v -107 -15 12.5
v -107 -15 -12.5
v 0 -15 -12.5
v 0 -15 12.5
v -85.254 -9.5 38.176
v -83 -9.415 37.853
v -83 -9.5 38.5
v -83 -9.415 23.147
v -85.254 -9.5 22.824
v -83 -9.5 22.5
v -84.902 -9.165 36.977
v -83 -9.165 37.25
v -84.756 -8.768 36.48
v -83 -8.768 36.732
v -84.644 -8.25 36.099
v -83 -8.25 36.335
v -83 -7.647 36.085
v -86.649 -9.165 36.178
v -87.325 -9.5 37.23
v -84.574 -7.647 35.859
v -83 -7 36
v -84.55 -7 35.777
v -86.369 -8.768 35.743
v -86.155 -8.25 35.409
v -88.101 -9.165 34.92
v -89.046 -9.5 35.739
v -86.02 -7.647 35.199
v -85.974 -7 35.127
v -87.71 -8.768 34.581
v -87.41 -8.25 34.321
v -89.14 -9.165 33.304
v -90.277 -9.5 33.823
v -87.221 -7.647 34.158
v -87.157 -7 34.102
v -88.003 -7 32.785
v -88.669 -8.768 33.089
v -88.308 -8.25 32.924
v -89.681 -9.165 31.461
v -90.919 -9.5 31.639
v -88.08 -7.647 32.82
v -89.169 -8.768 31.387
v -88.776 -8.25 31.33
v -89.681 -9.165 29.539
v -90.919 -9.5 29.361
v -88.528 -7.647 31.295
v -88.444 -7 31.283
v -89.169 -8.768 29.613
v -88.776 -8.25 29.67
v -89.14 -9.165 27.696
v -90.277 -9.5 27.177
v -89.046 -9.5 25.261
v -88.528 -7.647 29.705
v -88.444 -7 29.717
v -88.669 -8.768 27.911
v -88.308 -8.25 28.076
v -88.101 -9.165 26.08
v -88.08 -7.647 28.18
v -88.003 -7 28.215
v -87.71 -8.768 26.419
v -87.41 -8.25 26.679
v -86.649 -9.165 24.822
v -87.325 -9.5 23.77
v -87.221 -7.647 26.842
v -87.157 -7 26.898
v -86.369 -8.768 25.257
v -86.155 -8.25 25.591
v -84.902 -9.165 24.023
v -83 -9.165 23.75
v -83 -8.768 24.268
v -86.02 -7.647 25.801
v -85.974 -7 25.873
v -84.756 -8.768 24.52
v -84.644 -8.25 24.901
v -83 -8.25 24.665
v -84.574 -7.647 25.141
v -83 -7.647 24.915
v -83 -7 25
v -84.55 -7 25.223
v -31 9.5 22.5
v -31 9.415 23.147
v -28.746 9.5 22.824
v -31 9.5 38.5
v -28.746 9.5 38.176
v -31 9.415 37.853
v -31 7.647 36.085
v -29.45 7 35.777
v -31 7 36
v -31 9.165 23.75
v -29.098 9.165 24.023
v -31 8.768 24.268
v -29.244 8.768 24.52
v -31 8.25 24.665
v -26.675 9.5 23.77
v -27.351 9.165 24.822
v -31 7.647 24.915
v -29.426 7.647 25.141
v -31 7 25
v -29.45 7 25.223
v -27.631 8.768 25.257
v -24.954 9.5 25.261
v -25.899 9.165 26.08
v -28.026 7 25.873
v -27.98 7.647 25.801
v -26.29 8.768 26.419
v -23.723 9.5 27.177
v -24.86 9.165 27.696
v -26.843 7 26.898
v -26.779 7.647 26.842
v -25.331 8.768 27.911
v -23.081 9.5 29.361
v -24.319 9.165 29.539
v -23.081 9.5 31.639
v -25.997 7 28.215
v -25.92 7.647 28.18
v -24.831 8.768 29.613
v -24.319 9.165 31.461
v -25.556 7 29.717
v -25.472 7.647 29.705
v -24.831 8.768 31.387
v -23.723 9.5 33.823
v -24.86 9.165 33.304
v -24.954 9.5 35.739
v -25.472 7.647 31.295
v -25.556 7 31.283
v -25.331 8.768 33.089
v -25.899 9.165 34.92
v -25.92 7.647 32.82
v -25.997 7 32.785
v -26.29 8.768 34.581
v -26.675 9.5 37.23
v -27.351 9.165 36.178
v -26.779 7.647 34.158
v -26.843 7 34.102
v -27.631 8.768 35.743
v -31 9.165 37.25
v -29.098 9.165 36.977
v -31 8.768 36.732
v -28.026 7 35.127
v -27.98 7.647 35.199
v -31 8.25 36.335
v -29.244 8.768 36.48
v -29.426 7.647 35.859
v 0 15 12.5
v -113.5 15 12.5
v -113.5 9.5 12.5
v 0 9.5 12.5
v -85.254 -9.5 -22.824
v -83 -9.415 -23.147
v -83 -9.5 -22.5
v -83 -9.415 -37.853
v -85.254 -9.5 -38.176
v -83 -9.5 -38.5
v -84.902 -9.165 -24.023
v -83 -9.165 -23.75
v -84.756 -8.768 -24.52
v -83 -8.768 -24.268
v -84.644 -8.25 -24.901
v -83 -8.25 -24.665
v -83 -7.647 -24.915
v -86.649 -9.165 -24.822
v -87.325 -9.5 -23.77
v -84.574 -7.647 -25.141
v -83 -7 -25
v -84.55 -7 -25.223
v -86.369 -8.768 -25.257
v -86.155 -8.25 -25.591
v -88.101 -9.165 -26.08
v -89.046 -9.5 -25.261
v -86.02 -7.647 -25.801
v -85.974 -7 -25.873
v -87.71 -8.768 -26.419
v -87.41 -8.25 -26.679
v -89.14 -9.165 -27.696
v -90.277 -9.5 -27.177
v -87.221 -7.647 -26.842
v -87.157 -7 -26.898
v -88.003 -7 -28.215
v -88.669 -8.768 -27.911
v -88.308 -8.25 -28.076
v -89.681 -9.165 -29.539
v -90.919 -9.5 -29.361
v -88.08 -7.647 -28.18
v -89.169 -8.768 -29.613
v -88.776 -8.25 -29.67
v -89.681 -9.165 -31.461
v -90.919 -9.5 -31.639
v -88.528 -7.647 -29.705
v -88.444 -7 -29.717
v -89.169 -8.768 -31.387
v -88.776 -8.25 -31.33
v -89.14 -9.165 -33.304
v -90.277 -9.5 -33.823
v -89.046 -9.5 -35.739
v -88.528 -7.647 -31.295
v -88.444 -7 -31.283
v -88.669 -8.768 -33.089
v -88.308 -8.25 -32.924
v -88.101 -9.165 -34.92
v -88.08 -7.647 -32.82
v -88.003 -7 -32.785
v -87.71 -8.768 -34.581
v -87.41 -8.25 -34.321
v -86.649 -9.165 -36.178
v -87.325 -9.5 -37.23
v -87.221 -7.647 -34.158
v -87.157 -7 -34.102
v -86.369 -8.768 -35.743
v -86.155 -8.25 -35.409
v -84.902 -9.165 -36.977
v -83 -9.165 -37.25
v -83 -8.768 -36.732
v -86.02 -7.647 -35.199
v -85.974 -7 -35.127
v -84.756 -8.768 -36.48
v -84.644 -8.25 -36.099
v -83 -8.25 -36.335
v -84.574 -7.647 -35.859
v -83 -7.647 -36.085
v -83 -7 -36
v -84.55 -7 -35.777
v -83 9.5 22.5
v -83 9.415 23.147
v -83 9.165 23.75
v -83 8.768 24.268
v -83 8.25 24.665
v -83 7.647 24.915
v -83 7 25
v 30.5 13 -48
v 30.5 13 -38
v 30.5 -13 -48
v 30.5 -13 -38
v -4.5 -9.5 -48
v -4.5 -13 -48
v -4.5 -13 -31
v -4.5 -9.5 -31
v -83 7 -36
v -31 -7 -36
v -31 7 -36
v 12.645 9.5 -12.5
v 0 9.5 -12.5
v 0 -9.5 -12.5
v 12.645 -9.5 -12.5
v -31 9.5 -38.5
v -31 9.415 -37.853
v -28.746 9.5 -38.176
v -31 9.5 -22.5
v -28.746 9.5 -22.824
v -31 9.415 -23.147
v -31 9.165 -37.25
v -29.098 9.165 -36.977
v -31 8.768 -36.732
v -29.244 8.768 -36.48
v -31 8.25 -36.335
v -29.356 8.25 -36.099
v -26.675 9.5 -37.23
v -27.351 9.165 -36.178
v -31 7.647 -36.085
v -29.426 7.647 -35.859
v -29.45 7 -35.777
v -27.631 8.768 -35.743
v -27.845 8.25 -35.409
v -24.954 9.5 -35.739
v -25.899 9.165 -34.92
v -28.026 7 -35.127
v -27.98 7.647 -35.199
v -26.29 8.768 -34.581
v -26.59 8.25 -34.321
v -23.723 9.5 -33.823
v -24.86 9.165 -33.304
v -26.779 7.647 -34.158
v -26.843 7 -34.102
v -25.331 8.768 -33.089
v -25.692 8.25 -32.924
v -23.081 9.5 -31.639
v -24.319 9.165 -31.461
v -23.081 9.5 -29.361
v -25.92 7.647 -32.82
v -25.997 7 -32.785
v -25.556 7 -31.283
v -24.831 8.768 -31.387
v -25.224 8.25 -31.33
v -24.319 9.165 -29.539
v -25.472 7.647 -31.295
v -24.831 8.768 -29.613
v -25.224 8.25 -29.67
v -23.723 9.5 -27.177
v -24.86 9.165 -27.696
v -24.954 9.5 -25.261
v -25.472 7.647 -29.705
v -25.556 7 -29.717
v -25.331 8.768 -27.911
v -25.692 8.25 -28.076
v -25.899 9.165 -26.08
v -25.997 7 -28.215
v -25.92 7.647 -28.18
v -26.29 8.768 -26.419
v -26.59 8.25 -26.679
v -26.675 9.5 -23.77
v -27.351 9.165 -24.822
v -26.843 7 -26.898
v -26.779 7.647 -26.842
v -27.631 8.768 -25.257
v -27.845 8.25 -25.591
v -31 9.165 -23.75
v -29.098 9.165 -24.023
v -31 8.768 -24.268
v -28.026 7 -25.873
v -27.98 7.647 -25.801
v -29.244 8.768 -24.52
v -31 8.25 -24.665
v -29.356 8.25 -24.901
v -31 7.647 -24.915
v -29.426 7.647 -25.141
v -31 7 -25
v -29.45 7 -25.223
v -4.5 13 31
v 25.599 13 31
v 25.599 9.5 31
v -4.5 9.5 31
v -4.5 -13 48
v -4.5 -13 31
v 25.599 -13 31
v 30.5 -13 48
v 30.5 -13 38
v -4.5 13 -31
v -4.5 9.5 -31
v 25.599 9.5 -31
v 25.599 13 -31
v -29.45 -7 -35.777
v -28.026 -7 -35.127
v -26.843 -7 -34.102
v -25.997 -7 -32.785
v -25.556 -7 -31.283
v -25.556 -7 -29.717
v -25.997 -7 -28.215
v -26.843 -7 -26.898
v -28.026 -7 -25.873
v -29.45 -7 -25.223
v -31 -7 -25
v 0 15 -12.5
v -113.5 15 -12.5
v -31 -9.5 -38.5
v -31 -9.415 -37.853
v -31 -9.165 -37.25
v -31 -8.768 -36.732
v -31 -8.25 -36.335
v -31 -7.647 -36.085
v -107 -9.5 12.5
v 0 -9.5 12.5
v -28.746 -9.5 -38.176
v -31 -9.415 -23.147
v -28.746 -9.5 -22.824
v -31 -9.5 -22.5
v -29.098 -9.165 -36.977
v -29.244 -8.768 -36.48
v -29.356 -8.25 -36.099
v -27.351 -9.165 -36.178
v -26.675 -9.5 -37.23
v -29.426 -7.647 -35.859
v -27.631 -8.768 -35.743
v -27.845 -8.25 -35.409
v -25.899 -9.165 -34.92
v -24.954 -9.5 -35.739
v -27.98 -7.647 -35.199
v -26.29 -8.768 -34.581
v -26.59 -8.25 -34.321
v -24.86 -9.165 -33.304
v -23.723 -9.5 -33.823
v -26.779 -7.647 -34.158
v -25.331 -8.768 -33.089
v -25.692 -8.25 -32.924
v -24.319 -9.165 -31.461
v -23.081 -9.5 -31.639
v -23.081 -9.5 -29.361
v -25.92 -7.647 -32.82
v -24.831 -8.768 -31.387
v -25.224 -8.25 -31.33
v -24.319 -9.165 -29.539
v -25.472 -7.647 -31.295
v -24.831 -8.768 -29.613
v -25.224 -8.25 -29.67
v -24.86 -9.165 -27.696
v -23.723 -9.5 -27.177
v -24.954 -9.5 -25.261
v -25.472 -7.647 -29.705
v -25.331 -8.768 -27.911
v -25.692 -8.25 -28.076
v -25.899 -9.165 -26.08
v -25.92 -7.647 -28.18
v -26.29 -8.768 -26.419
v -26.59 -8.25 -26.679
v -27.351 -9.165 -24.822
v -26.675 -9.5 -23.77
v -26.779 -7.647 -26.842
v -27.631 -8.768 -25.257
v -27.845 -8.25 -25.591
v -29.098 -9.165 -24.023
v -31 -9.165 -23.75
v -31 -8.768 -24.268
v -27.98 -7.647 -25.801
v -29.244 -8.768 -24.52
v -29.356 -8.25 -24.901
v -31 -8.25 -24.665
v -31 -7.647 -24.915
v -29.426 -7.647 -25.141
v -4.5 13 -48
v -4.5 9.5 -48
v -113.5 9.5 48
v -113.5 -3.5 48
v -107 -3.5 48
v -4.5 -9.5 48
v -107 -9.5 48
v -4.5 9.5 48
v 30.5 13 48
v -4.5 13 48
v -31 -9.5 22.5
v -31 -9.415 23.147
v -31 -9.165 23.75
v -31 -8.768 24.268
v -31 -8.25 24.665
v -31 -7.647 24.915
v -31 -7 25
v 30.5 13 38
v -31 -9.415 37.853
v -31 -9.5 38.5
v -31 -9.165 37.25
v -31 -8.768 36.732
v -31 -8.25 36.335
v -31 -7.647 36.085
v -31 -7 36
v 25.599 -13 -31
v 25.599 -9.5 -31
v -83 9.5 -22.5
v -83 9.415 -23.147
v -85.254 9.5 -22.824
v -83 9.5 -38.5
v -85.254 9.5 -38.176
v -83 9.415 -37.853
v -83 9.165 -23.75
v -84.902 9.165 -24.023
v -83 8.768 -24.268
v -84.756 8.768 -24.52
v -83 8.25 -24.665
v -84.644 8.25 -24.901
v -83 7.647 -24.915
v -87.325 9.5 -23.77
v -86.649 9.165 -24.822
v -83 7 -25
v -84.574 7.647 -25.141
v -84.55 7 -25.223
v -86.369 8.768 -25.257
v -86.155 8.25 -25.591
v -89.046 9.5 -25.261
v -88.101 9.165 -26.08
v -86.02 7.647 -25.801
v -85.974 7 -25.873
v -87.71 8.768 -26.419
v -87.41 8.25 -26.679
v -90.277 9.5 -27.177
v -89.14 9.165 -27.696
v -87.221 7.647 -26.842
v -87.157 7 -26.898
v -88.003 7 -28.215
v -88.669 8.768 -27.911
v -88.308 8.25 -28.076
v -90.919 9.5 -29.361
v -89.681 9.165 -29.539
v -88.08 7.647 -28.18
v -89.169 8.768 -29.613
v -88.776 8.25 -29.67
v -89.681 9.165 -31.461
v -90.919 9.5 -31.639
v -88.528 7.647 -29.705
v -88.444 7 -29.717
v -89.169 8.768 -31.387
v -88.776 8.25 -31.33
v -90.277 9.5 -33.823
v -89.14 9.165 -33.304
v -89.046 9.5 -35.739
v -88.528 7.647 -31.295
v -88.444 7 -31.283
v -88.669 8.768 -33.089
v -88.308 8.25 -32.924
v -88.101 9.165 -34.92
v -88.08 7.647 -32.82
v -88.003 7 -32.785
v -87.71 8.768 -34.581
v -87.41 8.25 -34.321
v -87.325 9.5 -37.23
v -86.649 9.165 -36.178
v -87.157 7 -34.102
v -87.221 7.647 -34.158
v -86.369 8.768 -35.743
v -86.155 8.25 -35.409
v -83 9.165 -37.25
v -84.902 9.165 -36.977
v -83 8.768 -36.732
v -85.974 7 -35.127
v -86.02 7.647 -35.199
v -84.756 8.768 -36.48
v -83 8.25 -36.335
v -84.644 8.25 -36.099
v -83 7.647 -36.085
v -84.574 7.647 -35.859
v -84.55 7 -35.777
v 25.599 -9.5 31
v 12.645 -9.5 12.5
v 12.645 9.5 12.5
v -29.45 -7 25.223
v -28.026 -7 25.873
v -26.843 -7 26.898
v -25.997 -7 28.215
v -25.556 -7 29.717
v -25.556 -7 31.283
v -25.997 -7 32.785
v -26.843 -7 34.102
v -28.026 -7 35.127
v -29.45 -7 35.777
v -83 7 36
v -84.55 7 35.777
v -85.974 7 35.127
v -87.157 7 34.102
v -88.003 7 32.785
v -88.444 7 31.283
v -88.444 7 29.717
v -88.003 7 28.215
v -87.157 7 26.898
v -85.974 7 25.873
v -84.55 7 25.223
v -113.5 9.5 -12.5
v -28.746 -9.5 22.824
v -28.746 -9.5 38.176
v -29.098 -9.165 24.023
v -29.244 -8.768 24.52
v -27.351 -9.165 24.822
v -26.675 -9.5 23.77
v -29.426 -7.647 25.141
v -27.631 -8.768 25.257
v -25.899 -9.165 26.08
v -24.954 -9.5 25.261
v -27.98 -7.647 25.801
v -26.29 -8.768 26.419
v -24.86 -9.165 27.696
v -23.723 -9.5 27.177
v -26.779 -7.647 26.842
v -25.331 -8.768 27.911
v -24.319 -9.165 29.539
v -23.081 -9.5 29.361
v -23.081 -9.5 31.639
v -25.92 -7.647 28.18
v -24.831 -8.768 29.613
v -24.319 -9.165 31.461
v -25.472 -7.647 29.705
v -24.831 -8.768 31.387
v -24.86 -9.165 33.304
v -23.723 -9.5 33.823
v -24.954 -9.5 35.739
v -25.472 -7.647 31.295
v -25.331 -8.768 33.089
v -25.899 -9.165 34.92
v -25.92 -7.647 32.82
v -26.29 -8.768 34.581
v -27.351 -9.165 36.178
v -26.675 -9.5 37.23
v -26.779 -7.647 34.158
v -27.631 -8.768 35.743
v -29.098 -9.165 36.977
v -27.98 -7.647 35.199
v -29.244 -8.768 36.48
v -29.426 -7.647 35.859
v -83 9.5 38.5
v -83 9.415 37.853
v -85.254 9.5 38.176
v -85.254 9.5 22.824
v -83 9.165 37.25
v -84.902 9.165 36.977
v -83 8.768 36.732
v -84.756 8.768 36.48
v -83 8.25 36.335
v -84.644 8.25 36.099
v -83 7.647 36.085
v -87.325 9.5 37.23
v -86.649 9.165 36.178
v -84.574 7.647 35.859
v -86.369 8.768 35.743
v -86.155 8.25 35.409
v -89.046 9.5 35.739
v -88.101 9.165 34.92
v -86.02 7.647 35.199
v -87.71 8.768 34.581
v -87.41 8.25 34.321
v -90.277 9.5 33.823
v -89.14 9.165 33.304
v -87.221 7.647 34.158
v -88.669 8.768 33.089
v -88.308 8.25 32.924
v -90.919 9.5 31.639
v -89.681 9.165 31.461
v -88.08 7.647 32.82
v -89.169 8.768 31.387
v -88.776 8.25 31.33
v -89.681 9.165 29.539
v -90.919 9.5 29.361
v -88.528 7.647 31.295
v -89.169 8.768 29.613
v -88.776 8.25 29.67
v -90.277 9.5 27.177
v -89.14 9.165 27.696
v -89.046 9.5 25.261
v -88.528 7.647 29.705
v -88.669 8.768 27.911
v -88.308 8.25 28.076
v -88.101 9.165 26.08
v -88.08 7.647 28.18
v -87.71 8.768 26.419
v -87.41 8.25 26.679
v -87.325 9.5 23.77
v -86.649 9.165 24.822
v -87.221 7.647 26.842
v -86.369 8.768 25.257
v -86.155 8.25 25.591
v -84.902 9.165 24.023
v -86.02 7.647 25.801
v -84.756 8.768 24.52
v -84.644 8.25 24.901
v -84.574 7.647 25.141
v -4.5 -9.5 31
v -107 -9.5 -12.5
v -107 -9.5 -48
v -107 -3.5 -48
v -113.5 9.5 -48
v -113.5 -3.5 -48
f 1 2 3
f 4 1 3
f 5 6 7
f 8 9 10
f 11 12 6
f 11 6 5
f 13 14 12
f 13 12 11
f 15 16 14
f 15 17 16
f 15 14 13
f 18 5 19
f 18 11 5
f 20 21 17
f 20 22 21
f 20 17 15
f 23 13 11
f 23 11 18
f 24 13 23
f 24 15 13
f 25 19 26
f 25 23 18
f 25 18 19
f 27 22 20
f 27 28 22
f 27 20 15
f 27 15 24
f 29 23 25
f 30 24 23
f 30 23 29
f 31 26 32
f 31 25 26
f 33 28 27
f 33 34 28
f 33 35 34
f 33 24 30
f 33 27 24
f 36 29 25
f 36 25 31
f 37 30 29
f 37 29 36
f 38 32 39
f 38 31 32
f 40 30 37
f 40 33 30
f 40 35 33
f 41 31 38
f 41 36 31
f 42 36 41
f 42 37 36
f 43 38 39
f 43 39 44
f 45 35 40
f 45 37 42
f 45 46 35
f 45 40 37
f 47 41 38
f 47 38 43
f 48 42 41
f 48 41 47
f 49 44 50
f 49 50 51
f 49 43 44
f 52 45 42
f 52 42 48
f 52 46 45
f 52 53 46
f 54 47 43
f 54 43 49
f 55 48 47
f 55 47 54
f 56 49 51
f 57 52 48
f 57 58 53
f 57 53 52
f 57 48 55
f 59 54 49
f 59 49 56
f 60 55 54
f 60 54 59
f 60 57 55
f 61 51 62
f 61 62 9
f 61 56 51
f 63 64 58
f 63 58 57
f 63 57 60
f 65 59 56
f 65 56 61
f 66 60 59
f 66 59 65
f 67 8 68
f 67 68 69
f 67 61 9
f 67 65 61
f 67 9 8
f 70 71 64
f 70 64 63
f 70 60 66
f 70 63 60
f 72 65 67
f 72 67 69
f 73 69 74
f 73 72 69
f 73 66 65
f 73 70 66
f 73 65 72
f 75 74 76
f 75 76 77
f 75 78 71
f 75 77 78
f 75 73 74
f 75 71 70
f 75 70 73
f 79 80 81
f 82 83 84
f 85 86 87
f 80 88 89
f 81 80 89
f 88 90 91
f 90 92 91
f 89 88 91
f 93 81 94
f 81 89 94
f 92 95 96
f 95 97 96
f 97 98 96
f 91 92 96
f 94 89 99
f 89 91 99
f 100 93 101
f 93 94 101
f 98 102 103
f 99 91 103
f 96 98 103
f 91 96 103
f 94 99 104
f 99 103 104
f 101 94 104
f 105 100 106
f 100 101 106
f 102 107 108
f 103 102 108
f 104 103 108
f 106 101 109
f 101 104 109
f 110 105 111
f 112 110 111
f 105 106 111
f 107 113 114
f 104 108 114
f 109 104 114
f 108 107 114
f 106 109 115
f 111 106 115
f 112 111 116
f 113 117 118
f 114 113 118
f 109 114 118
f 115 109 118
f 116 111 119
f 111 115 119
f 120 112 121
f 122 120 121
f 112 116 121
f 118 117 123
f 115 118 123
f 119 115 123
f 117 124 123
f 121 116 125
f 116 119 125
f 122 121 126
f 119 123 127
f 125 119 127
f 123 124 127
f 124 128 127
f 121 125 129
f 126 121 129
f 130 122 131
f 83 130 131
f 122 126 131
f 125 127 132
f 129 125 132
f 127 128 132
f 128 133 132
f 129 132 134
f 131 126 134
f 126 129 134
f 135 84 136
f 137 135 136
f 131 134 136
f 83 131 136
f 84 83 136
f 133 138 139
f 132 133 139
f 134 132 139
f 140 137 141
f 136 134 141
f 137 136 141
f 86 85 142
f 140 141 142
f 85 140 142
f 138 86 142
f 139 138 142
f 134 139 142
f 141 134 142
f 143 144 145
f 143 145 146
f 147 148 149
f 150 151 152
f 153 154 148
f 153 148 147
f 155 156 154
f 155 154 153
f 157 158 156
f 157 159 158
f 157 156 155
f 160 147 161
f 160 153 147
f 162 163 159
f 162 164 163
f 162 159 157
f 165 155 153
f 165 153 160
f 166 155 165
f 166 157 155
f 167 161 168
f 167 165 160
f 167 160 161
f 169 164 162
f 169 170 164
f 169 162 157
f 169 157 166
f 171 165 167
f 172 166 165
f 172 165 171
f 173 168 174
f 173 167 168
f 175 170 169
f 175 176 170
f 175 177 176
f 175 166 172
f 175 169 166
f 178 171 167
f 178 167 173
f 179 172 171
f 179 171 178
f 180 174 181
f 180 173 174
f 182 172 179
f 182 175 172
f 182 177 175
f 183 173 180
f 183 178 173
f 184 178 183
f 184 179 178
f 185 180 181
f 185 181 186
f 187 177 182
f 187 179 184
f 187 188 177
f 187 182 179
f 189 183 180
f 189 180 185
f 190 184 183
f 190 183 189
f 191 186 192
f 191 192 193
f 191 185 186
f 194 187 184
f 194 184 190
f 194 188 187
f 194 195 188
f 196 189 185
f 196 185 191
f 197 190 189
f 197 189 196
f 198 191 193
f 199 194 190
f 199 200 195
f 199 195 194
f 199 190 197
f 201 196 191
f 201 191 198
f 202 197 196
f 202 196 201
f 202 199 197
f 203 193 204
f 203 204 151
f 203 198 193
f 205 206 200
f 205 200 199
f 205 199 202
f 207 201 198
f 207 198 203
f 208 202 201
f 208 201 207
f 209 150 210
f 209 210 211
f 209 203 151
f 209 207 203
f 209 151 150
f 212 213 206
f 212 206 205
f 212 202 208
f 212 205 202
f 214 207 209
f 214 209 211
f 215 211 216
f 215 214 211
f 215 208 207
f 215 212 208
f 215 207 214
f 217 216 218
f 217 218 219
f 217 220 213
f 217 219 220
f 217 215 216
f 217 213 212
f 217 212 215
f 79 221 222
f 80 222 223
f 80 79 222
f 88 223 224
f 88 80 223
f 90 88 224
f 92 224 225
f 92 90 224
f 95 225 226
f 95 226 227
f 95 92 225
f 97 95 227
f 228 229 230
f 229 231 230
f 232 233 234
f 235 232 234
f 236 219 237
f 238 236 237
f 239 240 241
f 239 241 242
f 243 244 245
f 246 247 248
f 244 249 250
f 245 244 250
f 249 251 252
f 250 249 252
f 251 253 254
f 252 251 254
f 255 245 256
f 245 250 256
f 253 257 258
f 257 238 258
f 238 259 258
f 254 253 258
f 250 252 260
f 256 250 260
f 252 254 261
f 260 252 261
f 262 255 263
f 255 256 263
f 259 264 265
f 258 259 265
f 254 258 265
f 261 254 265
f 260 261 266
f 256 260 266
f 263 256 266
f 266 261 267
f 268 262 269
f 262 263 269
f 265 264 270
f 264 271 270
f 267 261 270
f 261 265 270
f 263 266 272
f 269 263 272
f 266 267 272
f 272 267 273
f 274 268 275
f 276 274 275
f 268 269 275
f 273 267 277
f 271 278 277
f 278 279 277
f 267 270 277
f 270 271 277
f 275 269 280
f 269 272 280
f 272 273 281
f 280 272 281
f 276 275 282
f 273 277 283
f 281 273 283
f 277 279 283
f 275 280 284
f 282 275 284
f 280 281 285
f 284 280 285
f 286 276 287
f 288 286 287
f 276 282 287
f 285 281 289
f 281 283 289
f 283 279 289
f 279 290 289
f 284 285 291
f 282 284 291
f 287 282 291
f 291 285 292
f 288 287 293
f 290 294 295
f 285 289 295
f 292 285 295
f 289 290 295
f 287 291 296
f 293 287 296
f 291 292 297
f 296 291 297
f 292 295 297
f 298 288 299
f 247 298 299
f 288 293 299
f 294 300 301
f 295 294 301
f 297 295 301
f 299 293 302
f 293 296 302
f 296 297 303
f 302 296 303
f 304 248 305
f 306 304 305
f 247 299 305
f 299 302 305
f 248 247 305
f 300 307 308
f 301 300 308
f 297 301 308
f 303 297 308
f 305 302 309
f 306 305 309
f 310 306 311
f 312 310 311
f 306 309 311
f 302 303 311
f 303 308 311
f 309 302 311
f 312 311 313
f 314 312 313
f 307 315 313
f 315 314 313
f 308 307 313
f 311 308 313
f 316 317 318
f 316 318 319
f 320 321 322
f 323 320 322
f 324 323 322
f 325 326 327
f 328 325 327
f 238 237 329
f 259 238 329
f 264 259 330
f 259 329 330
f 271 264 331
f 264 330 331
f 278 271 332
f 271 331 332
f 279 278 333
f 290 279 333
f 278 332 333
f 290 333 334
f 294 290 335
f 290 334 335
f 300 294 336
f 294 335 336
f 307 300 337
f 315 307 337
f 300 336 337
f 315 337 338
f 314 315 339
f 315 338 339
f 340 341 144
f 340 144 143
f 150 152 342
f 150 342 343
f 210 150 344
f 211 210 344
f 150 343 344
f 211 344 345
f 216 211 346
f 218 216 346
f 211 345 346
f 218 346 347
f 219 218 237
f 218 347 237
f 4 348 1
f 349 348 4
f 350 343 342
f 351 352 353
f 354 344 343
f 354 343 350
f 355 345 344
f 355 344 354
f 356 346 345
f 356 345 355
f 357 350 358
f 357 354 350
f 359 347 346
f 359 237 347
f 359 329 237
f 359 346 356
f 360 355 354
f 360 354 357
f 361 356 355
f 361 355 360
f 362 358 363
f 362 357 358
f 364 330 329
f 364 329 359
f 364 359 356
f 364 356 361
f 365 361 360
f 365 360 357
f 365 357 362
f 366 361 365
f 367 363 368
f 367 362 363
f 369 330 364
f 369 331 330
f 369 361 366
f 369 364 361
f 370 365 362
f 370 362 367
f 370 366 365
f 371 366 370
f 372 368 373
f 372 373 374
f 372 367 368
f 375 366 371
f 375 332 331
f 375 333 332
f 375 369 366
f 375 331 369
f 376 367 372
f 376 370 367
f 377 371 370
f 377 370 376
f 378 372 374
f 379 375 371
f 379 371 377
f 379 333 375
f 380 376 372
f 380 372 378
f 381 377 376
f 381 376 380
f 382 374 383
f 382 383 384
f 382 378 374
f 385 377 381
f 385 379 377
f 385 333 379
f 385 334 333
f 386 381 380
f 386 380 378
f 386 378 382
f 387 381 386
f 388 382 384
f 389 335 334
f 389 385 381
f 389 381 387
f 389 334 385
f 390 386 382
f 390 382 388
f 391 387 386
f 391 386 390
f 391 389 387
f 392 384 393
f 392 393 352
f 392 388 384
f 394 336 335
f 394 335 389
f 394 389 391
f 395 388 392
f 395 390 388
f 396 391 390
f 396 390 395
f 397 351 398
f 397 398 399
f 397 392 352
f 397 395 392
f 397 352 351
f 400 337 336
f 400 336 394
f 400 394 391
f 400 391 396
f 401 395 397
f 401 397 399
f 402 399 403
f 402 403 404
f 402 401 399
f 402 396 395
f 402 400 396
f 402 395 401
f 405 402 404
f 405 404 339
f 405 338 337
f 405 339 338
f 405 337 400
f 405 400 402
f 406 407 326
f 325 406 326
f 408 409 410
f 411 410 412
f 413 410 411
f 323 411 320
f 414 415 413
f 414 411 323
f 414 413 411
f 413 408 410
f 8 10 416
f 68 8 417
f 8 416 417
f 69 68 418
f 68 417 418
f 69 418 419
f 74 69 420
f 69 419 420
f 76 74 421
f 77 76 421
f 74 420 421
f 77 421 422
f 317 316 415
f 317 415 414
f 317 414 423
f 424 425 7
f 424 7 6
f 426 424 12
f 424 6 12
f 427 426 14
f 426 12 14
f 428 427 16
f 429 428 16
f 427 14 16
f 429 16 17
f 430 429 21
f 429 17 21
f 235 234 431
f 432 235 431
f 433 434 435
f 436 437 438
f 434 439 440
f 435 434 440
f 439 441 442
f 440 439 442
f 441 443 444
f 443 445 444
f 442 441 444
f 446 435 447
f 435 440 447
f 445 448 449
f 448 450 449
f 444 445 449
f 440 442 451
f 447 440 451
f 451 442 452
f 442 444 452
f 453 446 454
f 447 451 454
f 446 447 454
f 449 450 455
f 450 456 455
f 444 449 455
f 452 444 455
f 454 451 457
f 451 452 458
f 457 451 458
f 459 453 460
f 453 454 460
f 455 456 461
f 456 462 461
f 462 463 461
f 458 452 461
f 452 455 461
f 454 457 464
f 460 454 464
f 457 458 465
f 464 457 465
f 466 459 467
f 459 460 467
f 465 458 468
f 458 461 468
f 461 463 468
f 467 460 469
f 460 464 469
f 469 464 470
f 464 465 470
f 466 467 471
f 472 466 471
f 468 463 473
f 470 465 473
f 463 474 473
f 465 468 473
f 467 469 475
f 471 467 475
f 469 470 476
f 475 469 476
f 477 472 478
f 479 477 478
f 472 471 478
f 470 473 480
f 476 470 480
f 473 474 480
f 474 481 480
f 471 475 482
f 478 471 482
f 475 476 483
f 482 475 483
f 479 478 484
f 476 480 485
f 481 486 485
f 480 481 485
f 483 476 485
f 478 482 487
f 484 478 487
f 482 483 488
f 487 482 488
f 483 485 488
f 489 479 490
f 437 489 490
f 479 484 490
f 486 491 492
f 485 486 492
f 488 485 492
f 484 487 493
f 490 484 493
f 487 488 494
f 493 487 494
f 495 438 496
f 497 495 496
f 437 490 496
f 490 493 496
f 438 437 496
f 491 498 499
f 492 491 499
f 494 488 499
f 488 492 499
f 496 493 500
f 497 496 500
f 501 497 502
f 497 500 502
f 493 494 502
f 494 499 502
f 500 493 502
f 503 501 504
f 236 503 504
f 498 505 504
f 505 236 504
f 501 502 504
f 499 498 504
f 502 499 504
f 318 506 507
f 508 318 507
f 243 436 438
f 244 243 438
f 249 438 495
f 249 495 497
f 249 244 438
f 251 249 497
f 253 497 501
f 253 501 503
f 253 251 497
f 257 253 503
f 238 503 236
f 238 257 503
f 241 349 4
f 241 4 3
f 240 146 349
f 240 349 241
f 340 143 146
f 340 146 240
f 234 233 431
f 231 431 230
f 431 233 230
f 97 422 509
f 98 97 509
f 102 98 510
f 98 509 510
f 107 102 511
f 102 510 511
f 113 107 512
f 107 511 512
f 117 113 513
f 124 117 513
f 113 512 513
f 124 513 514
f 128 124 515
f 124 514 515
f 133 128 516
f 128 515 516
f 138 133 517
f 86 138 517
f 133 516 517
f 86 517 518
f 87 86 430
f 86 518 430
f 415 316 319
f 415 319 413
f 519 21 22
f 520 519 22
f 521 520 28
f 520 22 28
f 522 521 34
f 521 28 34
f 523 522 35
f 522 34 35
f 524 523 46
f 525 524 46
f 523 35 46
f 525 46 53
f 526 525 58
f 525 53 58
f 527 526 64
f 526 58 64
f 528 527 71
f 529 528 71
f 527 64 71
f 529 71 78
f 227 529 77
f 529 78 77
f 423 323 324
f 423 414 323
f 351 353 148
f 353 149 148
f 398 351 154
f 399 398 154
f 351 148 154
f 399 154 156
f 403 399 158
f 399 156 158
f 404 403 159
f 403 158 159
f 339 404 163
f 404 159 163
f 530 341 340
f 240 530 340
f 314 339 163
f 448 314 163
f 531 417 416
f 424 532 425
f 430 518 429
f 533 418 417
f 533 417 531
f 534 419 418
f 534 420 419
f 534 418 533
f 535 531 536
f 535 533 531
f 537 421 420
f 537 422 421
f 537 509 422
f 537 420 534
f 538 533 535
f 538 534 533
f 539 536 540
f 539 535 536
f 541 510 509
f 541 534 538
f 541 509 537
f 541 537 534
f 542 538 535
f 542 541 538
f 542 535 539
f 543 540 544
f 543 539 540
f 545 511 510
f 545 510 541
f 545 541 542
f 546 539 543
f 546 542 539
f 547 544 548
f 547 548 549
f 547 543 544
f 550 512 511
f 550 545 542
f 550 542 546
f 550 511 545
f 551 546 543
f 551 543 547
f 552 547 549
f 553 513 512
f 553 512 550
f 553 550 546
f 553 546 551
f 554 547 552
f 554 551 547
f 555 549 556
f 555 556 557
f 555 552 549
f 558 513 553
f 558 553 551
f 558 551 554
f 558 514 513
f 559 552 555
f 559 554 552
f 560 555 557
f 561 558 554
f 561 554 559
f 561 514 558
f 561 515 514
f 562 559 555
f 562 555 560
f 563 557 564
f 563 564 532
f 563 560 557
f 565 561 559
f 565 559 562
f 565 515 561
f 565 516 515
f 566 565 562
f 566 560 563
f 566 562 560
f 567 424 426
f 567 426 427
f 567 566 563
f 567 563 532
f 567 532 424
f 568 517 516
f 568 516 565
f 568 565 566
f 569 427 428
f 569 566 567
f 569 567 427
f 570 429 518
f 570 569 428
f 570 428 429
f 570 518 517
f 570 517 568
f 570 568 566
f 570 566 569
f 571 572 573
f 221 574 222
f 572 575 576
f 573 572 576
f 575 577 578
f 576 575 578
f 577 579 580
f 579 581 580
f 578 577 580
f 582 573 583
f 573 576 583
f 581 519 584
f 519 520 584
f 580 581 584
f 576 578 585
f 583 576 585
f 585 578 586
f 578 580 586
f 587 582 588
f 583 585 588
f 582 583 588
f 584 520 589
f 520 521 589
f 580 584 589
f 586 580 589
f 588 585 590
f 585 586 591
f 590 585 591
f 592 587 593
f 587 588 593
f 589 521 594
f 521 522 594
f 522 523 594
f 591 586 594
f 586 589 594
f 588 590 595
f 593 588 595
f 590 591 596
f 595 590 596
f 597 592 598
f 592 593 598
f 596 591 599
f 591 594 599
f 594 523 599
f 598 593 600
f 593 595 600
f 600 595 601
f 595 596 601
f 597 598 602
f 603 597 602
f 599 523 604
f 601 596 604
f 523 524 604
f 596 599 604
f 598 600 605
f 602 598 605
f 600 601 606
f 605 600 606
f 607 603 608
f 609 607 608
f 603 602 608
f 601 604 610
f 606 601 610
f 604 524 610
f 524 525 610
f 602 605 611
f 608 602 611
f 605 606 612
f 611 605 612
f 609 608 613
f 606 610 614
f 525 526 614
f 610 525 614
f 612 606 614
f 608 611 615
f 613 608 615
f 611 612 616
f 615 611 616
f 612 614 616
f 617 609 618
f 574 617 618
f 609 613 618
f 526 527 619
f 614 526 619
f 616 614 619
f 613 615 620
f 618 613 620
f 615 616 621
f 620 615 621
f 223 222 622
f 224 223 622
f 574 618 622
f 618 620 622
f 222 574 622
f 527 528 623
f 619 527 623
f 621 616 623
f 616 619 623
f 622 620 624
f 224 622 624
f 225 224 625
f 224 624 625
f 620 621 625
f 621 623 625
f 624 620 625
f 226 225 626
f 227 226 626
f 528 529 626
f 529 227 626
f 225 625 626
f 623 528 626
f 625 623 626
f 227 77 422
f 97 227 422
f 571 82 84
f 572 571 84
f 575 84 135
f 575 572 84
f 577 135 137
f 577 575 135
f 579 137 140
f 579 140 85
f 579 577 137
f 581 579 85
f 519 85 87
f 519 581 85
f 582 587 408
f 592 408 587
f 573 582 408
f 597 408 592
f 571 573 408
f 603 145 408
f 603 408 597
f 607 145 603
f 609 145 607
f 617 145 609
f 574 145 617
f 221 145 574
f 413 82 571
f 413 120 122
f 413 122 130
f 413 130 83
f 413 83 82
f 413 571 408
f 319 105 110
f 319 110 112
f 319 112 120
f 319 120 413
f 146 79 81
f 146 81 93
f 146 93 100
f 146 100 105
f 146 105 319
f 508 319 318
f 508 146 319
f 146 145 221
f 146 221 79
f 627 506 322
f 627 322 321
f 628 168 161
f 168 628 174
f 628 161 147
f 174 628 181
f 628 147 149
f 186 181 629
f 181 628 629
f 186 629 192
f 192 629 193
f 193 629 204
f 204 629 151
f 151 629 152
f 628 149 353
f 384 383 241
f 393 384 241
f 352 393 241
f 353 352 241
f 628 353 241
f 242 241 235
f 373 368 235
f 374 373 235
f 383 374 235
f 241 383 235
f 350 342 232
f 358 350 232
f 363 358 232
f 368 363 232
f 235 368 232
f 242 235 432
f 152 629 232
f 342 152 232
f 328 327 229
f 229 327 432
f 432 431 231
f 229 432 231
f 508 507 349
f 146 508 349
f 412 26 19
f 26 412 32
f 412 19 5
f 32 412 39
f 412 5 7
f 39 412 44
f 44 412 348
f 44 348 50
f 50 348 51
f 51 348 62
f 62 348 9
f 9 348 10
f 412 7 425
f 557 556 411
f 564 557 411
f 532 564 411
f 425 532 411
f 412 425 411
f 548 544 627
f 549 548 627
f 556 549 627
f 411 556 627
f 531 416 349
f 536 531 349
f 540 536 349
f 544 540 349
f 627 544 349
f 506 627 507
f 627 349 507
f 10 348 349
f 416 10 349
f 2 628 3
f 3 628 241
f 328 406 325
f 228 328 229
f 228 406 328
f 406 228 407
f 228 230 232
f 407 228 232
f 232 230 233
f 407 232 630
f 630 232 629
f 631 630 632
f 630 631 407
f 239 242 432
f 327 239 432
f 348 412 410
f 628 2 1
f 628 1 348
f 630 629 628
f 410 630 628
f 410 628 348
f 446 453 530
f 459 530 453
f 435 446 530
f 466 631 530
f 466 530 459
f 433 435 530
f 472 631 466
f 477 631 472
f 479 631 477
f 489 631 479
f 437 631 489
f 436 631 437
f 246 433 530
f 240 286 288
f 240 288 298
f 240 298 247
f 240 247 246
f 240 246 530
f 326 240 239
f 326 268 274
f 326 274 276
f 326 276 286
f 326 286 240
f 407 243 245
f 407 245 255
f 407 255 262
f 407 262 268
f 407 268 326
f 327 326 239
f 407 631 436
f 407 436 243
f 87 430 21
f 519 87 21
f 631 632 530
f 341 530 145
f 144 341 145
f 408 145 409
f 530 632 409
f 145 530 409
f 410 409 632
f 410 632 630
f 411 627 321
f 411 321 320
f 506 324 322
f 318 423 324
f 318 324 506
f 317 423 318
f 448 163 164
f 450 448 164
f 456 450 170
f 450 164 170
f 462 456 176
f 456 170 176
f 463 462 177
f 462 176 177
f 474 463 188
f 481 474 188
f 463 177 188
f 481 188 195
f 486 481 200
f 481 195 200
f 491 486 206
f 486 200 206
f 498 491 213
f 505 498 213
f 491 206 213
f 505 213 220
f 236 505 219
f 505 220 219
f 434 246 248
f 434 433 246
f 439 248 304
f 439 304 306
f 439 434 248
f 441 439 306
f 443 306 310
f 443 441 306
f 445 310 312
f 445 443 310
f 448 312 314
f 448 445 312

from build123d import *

# Parameters (mm, degrees)
ESQUISSE1_W                  = 113.5
ESQUISSE1_H                  = 25
BOSS_EXTRU_1_DEPTH           = 15
BOSS_EXTRU_2_DEPTH           = 9.5
BOSS_EXTRU_2_DEPTH_BACK      = 9.5
BOSS_EXTRU_3_DEPTH           = 13
ENL_V_MAT_EXTRU_1_DEPTH      = 125.142055726
ENL_V_MAT_EXTRU_1_DEPTH_BACK = 125.142055726
ESQUISSE2_W                  = 6.5
ESQUISSE2_H                  = 11.5
CONG_1_R                     = 2.5


with BuildPart() as part:
    # Esquisse1 → Boss.-Extru.1 (new, symmetric)
    with BuildSketch(Plane(origin=(0, 0, 0), x_dir=(1, 0, 0), z_dir=(0, 1, 0))):
        with Locations((-56.75, 0)):
            Rectangle(ESQUISSE1_W, ESQUISSE1_H)
    extrude(amount=BOSS_EXTRU_1_DEPTH, both=True)

    # Esquisse1<3> → Boss.-Extru.2 (add, two sides: drawn at the far end of the back side and taken through both)
    # profile 1 of 2: a face of its own
    with BuildSketch(Plane(origin=(0, 0, 0), x_dir=(1, 0, 0), z_dir=(0, 1, 0)).offset(-BOSS_EXTRU_2_DEPTH_BACK)):
        Polygon((12.644707776, -12.5), (0, -12.5), (-113.5, -12.5), (-113.5, -48), (-4.5, -48), (-4.5, -31), (25.598547233, -31), align=None)
        with BuildLine():
            Line((-31, -36), (-83, -36))
            ThreePointArc((-83, -36), (-88.5, -30.5), (-83, -25))
            Line((-83, -25), (-31, -25))
            ThreePointArc((-31, -25), (-25.5, -30.5), (-31, -36))
        make_face(mode=Mode.SUBTRACT)
    # profile 2 of 2: a face of its own
    with BuildSketch(Plane(origin=(0, 0, 0), x_dir=(1, 0, 0), z_dir=(0, 1, 0)).offset(-BOSS_EXTRU_2_DEPTH_BACK)):
        Polygon((-113.5, 12.5), (0, 12.5), (12.644707776, 12.5), (25.598547233, 31), (-4.5, 31), (-4.5, 48), (-113.5, 48), align=None)
        with BuildLine():
            ThreePointArc((-83, 25), (-88.5, 30.5), (-83, 36))
            Line((-83, 36), (-31, 36))
            ThreePointArc((-31, 36), (-25.5, 30.5), (-31, 25))
            Line((-31, 25), (-83, 25))
        make_face(mode=Mode.SUBTRACT)
    extrude(amount=BOSS_EXTRU_2_DEPTH + BOSS_EXTRU_2_DEPTH_BACK)

    # Esquisse1<4> → Boss.-Extru.3 (add, symmetric)
    with BuildSketch(Plane(origin=(0, 0, 0), x_dir=(1, 0, 0), z_dir=(0, 1, 0))):
        Polygon((-4.5, 31), (25.598547233, 31), (30.5, 38), (30.5, 48), (-4.5, 48), align=None)
        Polygon((30.5, -38), (25.598547233, -31), (-4.5, -31), (-4.5, -48), (30.5, -48), align=None)
    extrude(amount=BOSS_EXTRU_3_DEPTH, both=True)

    # Esquisse2 → Enlèv. mat.-Extru.1 (cut, two sides: drawn at the far end of the back side and taken through both)
    with BuildSketch(Plane.XY.offset(-ENL_V_MAT_EXTRU_1_DEPTH_BACK)):
        with Locations((-110.25, -9.25)):
            Rectangle(ESQUISSE2_W, ESQUISSE2_H)
    extrude(amount=ENL_V_MAT_EXTRU_1_DEPTH + ENL_V_MAT_EXTRU_1_DEPTH_BACK, mode=Mode.SUBTRACT)

    # Congé1
    cong_1_edges = [part.edges().sort_by_distance(p)[0] for p in [
        (-57, 9.5, 36),
        (-57, -9.5, 36),
        (-88.5, 9.5, 30.5),
        (-57, 9.5, 25),
        (-25.5, 9.5, 30.5),
        (-57, -9.5, 25),
        (-88.5, -9.5, 30.5),
        (-25.5, -9.5, 30.5),
        (-25.5, 9.5, -30.5),
        (-25.5, -9.5, -30.5),
        (-57, 9.5, -25),
        (-57, -9.5, -25),
        (-88.5, 9.5, -30.5),
        (-88.5, -9.5, -30.5),
        (-57, 9.5, -36),
        (-57, -9.5, -36),
    ]]
    fillet(cong_1_edges, radius=CONG_1_R)


solid = part.part
